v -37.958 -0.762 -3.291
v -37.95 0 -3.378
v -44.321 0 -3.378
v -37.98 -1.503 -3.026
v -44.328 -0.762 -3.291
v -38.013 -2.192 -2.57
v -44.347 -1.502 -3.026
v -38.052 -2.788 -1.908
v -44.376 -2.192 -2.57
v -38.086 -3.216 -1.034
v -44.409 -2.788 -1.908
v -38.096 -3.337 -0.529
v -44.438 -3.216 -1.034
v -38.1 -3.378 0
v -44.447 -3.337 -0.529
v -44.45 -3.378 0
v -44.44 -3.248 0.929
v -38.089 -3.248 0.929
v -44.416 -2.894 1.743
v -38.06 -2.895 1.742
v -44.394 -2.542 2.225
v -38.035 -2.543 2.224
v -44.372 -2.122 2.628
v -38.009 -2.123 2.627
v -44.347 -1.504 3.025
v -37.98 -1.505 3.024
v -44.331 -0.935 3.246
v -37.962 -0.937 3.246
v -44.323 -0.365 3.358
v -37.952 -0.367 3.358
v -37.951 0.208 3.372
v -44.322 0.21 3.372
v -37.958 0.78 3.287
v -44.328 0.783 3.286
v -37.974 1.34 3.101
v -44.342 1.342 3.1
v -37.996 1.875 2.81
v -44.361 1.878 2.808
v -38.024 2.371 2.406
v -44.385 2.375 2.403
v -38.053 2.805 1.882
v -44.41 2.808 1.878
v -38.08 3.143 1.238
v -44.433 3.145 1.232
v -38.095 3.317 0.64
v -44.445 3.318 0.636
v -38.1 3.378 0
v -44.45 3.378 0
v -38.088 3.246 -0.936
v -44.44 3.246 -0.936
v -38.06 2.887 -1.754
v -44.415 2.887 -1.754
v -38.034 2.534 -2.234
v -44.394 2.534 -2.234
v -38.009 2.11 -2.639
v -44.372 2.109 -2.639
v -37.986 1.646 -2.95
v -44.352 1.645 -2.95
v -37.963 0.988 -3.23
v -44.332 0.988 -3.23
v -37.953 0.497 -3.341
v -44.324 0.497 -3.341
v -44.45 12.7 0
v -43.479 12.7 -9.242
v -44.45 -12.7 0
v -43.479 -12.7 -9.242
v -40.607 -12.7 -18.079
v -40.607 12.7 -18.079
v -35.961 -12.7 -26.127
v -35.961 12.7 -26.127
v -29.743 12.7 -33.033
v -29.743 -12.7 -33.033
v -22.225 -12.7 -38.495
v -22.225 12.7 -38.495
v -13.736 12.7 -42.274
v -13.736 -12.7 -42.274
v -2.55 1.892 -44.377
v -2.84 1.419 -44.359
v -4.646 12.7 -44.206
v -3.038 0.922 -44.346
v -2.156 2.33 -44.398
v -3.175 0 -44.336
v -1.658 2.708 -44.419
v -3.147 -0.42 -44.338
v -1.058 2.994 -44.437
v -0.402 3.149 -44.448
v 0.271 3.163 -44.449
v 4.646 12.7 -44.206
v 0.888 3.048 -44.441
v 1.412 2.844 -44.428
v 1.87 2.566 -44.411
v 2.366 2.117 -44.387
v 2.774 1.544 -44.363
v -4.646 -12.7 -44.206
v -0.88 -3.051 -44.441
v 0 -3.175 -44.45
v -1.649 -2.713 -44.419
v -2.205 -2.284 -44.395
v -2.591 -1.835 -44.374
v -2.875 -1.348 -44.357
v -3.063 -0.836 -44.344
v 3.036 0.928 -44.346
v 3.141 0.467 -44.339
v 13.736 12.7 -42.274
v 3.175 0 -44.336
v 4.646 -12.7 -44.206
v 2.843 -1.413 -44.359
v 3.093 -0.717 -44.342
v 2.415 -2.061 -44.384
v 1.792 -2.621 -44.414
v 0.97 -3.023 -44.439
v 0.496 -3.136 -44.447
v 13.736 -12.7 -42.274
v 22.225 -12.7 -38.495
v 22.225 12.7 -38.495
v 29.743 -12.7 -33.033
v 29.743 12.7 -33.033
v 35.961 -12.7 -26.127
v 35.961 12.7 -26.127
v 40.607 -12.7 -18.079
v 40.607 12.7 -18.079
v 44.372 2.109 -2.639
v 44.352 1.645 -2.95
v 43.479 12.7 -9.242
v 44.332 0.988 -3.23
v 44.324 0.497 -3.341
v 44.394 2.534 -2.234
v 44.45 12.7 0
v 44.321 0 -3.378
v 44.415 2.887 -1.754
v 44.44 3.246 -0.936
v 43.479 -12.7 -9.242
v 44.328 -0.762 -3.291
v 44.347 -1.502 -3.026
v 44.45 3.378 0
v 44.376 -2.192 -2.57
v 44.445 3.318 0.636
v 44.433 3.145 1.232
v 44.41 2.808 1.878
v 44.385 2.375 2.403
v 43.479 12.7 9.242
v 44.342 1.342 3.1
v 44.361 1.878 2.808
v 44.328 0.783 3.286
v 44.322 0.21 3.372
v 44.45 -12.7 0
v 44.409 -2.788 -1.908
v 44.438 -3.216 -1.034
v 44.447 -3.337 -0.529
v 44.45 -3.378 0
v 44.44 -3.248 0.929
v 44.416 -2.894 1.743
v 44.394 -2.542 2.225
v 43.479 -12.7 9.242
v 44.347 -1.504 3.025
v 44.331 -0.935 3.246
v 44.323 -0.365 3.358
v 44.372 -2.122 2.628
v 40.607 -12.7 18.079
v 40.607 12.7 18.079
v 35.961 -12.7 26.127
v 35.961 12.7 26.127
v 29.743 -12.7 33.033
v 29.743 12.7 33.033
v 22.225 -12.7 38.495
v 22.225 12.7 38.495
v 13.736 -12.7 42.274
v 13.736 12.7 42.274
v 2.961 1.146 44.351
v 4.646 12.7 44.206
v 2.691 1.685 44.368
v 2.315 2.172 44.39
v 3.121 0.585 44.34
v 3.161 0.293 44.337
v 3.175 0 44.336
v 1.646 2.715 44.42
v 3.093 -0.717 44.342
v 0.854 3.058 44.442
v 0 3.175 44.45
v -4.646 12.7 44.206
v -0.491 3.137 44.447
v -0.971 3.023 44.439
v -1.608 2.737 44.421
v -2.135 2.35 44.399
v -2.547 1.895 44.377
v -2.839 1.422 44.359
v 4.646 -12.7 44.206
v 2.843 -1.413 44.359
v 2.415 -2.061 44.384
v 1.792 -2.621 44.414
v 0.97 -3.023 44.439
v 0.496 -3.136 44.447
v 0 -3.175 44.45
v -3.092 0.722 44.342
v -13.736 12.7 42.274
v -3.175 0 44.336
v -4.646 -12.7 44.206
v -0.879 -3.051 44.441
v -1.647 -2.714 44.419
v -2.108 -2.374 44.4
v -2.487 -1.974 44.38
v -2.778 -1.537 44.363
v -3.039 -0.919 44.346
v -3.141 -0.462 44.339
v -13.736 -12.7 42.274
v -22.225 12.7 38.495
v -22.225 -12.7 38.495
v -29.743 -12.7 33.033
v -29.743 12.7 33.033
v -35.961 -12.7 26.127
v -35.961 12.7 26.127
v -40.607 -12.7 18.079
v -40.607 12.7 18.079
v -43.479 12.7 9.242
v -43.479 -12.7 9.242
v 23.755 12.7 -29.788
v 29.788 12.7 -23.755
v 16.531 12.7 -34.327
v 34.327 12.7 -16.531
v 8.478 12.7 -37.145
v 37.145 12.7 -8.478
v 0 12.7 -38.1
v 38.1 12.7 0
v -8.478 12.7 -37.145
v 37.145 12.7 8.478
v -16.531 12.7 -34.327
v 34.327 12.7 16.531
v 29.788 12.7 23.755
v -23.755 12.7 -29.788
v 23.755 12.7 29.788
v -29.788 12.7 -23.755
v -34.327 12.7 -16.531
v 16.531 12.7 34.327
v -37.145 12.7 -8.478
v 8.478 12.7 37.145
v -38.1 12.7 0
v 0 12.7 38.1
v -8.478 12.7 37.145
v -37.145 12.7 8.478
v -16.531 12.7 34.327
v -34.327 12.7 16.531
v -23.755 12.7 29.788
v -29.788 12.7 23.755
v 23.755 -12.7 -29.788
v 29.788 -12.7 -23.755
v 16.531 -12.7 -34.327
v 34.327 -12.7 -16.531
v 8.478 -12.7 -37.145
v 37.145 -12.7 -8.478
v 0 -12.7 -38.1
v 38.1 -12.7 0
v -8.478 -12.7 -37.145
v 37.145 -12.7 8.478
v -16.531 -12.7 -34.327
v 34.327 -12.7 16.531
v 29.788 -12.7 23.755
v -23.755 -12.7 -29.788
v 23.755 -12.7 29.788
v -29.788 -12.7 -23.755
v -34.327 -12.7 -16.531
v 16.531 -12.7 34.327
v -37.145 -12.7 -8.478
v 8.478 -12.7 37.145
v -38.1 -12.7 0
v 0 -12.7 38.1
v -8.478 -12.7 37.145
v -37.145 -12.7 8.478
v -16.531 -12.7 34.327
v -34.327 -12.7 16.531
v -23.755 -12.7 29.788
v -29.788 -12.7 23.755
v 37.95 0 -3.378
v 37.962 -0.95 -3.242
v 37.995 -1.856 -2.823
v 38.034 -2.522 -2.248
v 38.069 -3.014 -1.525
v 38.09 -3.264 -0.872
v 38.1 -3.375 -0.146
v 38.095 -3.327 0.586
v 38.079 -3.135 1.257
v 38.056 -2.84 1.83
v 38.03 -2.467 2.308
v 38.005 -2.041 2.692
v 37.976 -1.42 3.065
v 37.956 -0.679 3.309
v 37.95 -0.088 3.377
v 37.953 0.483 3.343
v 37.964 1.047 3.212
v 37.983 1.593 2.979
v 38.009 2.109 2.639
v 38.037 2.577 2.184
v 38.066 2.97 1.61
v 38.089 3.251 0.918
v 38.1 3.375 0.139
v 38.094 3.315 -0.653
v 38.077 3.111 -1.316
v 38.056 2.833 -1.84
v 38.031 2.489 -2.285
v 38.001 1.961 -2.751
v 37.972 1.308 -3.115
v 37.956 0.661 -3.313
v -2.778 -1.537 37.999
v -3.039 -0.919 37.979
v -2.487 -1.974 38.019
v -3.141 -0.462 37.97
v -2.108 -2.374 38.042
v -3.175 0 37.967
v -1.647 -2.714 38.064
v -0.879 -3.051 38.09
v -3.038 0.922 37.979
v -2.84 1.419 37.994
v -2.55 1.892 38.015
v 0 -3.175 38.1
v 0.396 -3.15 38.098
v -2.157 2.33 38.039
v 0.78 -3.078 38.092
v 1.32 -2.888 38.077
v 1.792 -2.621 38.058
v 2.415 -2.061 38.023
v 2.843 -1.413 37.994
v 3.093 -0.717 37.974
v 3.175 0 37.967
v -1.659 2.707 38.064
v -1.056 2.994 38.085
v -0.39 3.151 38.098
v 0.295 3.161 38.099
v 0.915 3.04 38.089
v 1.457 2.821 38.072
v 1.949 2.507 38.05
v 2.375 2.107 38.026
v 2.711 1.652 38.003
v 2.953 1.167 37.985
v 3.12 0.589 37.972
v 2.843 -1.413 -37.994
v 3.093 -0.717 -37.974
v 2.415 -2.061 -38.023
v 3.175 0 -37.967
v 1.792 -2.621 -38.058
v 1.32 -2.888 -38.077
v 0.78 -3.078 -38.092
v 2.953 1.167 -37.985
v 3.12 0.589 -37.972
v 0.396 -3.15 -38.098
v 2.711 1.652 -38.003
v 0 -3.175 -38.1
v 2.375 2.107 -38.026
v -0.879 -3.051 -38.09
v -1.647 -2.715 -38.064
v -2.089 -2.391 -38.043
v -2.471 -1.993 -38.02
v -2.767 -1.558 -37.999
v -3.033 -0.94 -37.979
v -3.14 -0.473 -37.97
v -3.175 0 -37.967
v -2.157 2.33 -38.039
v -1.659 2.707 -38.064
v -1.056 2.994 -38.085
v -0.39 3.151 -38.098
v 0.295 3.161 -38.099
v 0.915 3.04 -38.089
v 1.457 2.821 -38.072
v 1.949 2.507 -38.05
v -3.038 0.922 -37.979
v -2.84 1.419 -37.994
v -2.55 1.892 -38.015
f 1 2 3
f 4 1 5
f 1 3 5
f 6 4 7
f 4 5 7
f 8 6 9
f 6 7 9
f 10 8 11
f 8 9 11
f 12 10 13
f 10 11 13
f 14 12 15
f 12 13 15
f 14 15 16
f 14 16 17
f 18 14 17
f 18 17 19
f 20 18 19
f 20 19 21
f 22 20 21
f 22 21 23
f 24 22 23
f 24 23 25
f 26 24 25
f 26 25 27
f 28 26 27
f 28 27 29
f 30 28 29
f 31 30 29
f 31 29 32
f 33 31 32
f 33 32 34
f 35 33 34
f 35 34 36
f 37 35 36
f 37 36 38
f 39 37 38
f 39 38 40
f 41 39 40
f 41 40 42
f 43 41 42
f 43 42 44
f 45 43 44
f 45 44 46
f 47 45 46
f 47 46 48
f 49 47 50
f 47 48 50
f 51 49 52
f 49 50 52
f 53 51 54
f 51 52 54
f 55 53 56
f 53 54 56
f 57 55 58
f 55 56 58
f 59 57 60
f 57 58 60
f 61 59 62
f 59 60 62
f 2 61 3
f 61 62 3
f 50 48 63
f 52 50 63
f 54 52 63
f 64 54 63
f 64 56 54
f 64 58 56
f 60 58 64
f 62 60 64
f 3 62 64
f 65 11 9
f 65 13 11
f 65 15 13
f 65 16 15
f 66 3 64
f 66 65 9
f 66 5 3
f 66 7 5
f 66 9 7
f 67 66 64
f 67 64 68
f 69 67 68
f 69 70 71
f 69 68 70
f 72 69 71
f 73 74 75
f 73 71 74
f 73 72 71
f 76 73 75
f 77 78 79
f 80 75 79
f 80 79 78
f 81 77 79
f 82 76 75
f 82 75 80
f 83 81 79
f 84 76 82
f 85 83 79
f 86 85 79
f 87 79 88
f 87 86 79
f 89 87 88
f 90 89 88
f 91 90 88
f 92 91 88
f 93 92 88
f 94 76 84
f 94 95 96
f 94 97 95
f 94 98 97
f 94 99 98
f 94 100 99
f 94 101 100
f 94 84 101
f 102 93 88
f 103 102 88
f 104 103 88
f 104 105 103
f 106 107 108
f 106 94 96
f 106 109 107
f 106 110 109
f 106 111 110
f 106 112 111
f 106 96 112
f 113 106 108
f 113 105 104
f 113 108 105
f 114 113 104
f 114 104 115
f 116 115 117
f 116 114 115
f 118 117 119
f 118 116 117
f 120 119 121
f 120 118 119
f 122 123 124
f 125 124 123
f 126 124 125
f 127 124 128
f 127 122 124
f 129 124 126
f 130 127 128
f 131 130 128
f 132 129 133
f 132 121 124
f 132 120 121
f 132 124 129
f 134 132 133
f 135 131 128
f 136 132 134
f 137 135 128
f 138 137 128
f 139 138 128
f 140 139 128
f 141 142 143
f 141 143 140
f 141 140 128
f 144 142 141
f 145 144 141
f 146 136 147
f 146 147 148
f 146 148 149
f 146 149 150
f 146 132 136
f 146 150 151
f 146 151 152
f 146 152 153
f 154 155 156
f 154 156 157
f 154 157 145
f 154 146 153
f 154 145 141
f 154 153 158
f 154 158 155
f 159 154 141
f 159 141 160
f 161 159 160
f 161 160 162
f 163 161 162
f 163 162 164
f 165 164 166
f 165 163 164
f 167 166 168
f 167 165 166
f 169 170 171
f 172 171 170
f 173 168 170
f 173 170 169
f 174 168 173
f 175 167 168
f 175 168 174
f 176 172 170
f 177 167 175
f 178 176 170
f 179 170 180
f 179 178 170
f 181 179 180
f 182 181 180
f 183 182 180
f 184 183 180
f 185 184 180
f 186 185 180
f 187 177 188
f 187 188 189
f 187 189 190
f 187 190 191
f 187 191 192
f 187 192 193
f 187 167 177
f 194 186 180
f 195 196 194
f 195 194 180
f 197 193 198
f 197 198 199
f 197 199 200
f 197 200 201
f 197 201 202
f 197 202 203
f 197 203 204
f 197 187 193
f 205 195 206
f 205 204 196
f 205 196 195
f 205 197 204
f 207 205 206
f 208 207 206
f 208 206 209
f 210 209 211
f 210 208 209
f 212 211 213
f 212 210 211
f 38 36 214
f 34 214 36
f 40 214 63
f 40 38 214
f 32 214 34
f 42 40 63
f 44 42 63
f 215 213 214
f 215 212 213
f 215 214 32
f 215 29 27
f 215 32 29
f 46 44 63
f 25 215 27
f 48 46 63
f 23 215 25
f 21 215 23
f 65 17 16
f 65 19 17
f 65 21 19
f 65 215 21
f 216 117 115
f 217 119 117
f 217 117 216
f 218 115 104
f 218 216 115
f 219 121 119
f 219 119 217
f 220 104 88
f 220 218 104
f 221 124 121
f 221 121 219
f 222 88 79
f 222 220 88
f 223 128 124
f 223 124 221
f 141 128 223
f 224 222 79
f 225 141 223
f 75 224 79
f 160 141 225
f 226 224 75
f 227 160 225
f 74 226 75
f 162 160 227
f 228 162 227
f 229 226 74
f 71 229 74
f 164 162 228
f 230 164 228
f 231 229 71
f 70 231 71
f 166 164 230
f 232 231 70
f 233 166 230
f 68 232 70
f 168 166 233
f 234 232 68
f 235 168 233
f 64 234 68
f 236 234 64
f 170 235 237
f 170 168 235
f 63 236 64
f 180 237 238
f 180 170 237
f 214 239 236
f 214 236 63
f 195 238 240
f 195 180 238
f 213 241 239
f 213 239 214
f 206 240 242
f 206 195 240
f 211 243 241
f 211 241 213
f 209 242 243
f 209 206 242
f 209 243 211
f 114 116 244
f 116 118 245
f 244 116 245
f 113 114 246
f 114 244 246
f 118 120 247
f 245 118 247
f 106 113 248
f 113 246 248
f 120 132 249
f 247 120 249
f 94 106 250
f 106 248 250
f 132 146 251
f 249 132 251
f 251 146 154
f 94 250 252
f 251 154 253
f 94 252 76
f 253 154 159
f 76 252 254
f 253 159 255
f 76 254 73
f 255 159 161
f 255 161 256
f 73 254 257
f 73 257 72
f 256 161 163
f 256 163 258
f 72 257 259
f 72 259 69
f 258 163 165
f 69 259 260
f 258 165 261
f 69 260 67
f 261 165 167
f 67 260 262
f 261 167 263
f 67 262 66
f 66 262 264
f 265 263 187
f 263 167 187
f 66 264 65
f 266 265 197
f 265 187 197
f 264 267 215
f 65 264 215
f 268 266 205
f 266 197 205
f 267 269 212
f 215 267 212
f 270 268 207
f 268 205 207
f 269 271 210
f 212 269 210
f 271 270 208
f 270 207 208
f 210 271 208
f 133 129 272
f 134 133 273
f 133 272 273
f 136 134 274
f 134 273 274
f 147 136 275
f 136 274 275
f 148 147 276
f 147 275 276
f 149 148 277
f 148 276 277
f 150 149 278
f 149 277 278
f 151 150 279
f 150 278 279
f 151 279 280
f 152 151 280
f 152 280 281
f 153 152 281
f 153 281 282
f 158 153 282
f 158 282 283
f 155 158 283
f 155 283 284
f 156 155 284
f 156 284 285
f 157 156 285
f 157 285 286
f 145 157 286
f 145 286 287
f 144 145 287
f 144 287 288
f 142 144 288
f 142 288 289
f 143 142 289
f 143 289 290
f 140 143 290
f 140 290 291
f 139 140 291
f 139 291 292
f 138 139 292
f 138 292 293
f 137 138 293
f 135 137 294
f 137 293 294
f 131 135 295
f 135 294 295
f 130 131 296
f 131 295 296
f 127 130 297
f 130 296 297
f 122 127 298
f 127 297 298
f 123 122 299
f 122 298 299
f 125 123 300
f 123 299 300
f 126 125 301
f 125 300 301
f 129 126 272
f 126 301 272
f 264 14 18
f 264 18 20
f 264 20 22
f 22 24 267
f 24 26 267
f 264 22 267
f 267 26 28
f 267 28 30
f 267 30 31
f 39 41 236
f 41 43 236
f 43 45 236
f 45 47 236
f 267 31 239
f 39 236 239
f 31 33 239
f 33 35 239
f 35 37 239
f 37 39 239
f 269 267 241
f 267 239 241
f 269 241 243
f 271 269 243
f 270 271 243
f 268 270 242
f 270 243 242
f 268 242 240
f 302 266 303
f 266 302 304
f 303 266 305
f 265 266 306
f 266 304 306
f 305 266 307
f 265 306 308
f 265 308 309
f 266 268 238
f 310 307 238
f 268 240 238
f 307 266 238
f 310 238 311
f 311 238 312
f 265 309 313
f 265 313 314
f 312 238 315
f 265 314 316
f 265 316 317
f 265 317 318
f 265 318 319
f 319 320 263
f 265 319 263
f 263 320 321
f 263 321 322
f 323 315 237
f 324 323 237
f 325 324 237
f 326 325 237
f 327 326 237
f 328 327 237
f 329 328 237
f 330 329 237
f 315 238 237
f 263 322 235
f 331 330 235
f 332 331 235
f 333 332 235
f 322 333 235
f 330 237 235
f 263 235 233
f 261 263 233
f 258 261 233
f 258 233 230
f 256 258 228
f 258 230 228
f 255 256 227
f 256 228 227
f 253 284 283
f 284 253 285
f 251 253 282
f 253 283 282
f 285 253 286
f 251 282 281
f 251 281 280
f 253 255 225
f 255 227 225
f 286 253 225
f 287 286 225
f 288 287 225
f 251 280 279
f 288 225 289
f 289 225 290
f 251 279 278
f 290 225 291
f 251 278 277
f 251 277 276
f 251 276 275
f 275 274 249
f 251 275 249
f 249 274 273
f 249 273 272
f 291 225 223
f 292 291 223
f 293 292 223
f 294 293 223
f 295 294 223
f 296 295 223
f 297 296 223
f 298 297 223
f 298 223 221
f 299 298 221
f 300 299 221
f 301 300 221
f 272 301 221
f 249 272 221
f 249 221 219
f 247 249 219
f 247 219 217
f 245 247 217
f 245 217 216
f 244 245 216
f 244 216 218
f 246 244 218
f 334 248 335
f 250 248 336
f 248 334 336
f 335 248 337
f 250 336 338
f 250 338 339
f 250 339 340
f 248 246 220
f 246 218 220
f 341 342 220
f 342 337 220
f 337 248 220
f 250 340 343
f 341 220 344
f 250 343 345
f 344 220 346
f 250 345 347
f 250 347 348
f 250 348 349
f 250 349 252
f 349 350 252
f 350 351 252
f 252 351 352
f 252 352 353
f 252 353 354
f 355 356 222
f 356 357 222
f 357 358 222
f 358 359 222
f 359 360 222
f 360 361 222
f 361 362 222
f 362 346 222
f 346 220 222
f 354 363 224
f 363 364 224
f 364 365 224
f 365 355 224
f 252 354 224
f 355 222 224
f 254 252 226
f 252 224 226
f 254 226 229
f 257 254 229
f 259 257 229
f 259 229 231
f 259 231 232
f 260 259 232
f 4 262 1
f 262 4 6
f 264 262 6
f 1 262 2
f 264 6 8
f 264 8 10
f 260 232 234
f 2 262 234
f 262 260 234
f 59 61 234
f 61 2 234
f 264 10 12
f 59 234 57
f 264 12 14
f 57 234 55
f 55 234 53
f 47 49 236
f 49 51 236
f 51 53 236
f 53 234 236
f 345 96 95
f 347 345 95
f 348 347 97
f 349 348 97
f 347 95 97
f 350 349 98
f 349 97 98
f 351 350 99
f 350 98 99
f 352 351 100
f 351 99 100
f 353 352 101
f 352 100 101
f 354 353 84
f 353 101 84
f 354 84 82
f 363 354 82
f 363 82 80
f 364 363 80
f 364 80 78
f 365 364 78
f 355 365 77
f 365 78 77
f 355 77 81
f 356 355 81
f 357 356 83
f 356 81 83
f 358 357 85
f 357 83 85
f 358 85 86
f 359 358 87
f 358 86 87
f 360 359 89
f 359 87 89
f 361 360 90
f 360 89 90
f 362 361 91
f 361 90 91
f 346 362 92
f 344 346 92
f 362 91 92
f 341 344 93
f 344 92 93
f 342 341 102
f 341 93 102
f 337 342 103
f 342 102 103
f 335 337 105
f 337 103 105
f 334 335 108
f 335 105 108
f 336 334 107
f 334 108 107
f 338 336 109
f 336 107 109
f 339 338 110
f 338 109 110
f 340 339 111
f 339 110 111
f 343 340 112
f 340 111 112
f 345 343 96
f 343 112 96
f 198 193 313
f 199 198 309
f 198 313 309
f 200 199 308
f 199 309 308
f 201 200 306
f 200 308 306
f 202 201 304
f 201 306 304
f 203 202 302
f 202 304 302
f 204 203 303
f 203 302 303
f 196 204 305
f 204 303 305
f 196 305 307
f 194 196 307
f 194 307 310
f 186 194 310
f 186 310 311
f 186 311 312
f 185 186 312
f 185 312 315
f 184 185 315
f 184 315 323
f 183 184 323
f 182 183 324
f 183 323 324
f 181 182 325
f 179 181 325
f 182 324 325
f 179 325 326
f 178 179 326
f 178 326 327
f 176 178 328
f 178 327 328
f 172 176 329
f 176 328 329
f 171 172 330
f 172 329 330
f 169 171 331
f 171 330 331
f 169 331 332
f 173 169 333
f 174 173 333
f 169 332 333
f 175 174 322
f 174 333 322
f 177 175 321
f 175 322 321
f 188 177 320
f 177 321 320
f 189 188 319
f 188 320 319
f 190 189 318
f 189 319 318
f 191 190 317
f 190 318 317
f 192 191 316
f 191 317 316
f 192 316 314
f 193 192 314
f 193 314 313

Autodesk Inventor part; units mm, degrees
ref_plane "XZ Plane" through (0, 0, 0) normal (0, 1, 0) x (-1, 0, 0)
sketch "Sketch1" plane through (0, 0, 0) normal (0, 1, 0) x (-1, 0, 0)
  circle A0 centre (0, 0) radius 38.1
  circle A1 centre (0, 0) radius 44.45
  dimension "d0" = 76.2
  dimension "d1" = 88.9
extrude "Extrusion1" add sketch "Sketch1" along normal mid plane 25.4
ref_plane "Work Plane1" through (0, 0, 44.45) normal (0, 0, 1) x (1, 0, 0)
sketch "Sketch2" plane through (0, 0, 44.45) normal (0, 0, 1) x (1, 0, 0)
  point P0 (0, 0)
  point P1 (0, 0)
hole "Hole1" at (0, 0, 44.45) direction (0, 0, -1) diameter 6.35 end through all
ref_plane "Work Plane2" through (44.45, 0, 0) normal (1, 0, 0) x (0, 1, 0)
sketch "Sketch3" plane through (44.45, 0, 0) normal (1, 0, 0) x (0, 1, 0)
  point P0 (0, 0)
  point P1 (0, 0)
hole "Hole2" at (44.45, 0, 0) direction (-1, 0, 0) diameter 6.7564 end through all clearance for "Flat Head Machine Screw (82)" size "1/4" standard "Ansi Unified Screw Threads"
equation "\"d0\" = cupDiam"
equation "\"d1\" = outerRingDism"
equation "\"d2\" = ringHeight"
equation "\"d5\" = ringAxelDiam"
equation "\"cupDiam\" = 76.2"
equation "\"ringThickness\" = 6.35"
equation "\"ringHeight\" = 25.4"
equation "\"ringAxelDiam\" = 6.35"
equation "\"outerRingDism\" = cupDiam + 2 * ringThickness"
equation "\"outerRingRadius\" = 0.5 * outerRingDism"
equation "\"d4\" = outerRingRadius"
equation "\"d12\" = outerRingRadius"
properties part number "RounedInnerRing"
